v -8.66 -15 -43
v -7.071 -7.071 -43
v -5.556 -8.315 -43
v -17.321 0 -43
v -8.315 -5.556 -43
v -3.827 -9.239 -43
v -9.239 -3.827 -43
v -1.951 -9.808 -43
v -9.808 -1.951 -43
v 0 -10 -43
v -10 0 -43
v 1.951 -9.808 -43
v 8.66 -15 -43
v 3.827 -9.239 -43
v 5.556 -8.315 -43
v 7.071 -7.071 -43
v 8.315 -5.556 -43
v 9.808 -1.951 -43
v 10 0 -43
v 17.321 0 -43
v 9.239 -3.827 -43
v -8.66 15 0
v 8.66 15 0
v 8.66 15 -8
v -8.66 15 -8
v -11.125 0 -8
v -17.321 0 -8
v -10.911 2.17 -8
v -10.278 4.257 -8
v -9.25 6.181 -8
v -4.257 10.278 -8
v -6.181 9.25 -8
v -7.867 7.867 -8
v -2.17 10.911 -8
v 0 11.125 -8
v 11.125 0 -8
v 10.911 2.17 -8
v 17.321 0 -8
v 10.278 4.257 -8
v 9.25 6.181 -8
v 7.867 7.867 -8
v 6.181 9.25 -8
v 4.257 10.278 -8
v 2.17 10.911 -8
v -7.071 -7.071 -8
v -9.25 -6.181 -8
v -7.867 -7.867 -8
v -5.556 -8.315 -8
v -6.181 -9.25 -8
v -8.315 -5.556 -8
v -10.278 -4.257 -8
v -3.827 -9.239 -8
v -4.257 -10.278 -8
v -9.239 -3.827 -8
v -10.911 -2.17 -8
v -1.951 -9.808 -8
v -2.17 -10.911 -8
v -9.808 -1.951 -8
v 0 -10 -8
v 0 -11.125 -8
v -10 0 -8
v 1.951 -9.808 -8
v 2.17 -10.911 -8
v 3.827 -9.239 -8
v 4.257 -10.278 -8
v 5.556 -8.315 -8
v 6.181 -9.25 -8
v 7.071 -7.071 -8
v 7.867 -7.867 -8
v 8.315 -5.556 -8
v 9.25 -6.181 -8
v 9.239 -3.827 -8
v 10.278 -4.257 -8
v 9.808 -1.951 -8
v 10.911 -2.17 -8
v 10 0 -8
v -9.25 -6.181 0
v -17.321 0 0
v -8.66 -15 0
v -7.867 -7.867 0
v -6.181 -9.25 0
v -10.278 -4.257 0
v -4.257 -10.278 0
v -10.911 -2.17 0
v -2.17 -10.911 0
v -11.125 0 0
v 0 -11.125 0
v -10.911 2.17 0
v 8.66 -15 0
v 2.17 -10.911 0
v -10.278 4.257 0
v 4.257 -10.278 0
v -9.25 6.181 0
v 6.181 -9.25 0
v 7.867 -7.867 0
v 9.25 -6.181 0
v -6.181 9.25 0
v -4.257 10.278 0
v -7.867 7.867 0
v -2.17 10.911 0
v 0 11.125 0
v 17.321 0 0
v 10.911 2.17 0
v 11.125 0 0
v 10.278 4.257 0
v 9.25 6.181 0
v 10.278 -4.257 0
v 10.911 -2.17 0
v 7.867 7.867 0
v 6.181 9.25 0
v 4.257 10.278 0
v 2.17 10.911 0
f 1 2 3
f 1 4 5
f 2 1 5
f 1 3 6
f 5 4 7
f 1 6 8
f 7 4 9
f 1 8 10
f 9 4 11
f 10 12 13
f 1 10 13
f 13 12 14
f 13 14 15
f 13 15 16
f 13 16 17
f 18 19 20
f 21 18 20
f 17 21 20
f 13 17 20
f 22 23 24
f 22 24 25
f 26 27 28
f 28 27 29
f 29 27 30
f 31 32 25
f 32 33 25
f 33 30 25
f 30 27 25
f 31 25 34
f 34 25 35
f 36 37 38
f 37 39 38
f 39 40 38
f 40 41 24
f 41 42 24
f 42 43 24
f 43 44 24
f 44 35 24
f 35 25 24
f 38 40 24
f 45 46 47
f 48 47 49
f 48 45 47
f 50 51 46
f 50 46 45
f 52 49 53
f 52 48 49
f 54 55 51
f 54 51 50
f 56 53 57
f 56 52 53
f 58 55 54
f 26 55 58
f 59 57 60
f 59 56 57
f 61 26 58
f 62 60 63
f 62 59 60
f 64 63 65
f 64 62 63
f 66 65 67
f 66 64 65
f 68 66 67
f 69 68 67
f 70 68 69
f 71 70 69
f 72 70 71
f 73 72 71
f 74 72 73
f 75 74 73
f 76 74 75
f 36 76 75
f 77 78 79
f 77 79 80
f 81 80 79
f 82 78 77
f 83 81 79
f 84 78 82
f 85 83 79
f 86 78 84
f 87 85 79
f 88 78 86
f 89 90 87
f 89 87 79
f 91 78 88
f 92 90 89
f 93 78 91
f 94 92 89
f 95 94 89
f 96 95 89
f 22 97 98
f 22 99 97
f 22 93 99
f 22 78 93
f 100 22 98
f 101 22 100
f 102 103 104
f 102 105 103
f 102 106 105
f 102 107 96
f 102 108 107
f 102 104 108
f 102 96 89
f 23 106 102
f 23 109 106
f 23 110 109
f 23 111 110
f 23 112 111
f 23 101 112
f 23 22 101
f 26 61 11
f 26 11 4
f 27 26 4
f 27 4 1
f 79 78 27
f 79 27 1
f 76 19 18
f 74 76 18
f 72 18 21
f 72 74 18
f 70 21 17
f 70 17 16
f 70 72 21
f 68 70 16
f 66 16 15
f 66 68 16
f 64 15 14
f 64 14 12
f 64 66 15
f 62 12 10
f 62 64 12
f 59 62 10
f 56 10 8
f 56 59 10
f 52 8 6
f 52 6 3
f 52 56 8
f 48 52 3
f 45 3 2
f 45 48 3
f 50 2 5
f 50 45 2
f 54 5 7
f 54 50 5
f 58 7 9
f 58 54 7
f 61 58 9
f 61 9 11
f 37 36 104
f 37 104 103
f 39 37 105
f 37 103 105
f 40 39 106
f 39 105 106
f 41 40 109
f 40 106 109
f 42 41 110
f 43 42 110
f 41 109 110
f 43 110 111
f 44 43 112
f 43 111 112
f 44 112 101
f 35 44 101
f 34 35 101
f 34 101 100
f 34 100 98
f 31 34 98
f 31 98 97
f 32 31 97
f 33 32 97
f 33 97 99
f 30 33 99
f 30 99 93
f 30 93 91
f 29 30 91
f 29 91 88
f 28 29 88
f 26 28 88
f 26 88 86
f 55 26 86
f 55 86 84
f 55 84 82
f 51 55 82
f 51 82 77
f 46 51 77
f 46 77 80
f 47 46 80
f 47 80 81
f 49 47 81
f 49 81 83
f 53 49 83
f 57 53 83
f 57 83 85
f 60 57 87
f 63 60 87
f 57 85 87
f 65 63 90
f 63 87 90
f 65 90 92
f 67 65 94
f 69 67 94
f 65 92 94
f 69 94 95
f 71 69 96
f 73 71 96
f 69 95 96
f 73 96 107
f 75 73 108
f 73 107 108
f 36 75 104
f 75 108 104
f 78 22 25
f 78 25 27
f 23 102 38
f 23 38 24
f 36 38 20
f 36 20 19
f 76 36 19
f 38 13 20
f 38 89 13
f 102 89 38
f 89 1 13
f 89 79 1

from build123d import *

# Parameters (mm, degrees)
SKETCH1_R           = 11.125
BOSS_EXTRUDE1_DEPTH = 8
BOSS_EXTRUDE2_DEPTH = 35


with BuildPart() as part:
    # Sketch1 → Boss-Extrude1 (new body)
    with BuildSketch(Plane.XY):
        Polygon((17.320508076, 0), (8.660254038, 15), (-8.660254038, 15), (-17.320508076, 0), (-8.660254038, -15), (8.660254038, -15), align=None)
        Circle(SKETCH1_R, mode=Mode.SUBTRACT)
    extrude(amount=-BOSS_EXTRUDE1_DEPTH)

    # Sketch2 → Boss-Extrude2 (add)
    with BuildSketch(Plane(origin=(0, 0, -8), x_dir=(-1, 0, 0), z_dir=(0, 0, -1))):
        with BuildLine():
            Line((-17.320508076, 0), (-10, 0))
            ThreePointArc((-10, 0), (0, -10), (10, 0))
            Line((10, 0), (17.320508076, 0))
            Line((17.320508076, 0), (8.660254038, -15))
            Line((8.660254038, -15), (-8.660254038, -15))
            Line((-8.660254038, -15), (-17.320508076, 0))
        make_face()
    extrude(amount=BOSS_EXTRUDE2_DEPTH)


solid = part.part
